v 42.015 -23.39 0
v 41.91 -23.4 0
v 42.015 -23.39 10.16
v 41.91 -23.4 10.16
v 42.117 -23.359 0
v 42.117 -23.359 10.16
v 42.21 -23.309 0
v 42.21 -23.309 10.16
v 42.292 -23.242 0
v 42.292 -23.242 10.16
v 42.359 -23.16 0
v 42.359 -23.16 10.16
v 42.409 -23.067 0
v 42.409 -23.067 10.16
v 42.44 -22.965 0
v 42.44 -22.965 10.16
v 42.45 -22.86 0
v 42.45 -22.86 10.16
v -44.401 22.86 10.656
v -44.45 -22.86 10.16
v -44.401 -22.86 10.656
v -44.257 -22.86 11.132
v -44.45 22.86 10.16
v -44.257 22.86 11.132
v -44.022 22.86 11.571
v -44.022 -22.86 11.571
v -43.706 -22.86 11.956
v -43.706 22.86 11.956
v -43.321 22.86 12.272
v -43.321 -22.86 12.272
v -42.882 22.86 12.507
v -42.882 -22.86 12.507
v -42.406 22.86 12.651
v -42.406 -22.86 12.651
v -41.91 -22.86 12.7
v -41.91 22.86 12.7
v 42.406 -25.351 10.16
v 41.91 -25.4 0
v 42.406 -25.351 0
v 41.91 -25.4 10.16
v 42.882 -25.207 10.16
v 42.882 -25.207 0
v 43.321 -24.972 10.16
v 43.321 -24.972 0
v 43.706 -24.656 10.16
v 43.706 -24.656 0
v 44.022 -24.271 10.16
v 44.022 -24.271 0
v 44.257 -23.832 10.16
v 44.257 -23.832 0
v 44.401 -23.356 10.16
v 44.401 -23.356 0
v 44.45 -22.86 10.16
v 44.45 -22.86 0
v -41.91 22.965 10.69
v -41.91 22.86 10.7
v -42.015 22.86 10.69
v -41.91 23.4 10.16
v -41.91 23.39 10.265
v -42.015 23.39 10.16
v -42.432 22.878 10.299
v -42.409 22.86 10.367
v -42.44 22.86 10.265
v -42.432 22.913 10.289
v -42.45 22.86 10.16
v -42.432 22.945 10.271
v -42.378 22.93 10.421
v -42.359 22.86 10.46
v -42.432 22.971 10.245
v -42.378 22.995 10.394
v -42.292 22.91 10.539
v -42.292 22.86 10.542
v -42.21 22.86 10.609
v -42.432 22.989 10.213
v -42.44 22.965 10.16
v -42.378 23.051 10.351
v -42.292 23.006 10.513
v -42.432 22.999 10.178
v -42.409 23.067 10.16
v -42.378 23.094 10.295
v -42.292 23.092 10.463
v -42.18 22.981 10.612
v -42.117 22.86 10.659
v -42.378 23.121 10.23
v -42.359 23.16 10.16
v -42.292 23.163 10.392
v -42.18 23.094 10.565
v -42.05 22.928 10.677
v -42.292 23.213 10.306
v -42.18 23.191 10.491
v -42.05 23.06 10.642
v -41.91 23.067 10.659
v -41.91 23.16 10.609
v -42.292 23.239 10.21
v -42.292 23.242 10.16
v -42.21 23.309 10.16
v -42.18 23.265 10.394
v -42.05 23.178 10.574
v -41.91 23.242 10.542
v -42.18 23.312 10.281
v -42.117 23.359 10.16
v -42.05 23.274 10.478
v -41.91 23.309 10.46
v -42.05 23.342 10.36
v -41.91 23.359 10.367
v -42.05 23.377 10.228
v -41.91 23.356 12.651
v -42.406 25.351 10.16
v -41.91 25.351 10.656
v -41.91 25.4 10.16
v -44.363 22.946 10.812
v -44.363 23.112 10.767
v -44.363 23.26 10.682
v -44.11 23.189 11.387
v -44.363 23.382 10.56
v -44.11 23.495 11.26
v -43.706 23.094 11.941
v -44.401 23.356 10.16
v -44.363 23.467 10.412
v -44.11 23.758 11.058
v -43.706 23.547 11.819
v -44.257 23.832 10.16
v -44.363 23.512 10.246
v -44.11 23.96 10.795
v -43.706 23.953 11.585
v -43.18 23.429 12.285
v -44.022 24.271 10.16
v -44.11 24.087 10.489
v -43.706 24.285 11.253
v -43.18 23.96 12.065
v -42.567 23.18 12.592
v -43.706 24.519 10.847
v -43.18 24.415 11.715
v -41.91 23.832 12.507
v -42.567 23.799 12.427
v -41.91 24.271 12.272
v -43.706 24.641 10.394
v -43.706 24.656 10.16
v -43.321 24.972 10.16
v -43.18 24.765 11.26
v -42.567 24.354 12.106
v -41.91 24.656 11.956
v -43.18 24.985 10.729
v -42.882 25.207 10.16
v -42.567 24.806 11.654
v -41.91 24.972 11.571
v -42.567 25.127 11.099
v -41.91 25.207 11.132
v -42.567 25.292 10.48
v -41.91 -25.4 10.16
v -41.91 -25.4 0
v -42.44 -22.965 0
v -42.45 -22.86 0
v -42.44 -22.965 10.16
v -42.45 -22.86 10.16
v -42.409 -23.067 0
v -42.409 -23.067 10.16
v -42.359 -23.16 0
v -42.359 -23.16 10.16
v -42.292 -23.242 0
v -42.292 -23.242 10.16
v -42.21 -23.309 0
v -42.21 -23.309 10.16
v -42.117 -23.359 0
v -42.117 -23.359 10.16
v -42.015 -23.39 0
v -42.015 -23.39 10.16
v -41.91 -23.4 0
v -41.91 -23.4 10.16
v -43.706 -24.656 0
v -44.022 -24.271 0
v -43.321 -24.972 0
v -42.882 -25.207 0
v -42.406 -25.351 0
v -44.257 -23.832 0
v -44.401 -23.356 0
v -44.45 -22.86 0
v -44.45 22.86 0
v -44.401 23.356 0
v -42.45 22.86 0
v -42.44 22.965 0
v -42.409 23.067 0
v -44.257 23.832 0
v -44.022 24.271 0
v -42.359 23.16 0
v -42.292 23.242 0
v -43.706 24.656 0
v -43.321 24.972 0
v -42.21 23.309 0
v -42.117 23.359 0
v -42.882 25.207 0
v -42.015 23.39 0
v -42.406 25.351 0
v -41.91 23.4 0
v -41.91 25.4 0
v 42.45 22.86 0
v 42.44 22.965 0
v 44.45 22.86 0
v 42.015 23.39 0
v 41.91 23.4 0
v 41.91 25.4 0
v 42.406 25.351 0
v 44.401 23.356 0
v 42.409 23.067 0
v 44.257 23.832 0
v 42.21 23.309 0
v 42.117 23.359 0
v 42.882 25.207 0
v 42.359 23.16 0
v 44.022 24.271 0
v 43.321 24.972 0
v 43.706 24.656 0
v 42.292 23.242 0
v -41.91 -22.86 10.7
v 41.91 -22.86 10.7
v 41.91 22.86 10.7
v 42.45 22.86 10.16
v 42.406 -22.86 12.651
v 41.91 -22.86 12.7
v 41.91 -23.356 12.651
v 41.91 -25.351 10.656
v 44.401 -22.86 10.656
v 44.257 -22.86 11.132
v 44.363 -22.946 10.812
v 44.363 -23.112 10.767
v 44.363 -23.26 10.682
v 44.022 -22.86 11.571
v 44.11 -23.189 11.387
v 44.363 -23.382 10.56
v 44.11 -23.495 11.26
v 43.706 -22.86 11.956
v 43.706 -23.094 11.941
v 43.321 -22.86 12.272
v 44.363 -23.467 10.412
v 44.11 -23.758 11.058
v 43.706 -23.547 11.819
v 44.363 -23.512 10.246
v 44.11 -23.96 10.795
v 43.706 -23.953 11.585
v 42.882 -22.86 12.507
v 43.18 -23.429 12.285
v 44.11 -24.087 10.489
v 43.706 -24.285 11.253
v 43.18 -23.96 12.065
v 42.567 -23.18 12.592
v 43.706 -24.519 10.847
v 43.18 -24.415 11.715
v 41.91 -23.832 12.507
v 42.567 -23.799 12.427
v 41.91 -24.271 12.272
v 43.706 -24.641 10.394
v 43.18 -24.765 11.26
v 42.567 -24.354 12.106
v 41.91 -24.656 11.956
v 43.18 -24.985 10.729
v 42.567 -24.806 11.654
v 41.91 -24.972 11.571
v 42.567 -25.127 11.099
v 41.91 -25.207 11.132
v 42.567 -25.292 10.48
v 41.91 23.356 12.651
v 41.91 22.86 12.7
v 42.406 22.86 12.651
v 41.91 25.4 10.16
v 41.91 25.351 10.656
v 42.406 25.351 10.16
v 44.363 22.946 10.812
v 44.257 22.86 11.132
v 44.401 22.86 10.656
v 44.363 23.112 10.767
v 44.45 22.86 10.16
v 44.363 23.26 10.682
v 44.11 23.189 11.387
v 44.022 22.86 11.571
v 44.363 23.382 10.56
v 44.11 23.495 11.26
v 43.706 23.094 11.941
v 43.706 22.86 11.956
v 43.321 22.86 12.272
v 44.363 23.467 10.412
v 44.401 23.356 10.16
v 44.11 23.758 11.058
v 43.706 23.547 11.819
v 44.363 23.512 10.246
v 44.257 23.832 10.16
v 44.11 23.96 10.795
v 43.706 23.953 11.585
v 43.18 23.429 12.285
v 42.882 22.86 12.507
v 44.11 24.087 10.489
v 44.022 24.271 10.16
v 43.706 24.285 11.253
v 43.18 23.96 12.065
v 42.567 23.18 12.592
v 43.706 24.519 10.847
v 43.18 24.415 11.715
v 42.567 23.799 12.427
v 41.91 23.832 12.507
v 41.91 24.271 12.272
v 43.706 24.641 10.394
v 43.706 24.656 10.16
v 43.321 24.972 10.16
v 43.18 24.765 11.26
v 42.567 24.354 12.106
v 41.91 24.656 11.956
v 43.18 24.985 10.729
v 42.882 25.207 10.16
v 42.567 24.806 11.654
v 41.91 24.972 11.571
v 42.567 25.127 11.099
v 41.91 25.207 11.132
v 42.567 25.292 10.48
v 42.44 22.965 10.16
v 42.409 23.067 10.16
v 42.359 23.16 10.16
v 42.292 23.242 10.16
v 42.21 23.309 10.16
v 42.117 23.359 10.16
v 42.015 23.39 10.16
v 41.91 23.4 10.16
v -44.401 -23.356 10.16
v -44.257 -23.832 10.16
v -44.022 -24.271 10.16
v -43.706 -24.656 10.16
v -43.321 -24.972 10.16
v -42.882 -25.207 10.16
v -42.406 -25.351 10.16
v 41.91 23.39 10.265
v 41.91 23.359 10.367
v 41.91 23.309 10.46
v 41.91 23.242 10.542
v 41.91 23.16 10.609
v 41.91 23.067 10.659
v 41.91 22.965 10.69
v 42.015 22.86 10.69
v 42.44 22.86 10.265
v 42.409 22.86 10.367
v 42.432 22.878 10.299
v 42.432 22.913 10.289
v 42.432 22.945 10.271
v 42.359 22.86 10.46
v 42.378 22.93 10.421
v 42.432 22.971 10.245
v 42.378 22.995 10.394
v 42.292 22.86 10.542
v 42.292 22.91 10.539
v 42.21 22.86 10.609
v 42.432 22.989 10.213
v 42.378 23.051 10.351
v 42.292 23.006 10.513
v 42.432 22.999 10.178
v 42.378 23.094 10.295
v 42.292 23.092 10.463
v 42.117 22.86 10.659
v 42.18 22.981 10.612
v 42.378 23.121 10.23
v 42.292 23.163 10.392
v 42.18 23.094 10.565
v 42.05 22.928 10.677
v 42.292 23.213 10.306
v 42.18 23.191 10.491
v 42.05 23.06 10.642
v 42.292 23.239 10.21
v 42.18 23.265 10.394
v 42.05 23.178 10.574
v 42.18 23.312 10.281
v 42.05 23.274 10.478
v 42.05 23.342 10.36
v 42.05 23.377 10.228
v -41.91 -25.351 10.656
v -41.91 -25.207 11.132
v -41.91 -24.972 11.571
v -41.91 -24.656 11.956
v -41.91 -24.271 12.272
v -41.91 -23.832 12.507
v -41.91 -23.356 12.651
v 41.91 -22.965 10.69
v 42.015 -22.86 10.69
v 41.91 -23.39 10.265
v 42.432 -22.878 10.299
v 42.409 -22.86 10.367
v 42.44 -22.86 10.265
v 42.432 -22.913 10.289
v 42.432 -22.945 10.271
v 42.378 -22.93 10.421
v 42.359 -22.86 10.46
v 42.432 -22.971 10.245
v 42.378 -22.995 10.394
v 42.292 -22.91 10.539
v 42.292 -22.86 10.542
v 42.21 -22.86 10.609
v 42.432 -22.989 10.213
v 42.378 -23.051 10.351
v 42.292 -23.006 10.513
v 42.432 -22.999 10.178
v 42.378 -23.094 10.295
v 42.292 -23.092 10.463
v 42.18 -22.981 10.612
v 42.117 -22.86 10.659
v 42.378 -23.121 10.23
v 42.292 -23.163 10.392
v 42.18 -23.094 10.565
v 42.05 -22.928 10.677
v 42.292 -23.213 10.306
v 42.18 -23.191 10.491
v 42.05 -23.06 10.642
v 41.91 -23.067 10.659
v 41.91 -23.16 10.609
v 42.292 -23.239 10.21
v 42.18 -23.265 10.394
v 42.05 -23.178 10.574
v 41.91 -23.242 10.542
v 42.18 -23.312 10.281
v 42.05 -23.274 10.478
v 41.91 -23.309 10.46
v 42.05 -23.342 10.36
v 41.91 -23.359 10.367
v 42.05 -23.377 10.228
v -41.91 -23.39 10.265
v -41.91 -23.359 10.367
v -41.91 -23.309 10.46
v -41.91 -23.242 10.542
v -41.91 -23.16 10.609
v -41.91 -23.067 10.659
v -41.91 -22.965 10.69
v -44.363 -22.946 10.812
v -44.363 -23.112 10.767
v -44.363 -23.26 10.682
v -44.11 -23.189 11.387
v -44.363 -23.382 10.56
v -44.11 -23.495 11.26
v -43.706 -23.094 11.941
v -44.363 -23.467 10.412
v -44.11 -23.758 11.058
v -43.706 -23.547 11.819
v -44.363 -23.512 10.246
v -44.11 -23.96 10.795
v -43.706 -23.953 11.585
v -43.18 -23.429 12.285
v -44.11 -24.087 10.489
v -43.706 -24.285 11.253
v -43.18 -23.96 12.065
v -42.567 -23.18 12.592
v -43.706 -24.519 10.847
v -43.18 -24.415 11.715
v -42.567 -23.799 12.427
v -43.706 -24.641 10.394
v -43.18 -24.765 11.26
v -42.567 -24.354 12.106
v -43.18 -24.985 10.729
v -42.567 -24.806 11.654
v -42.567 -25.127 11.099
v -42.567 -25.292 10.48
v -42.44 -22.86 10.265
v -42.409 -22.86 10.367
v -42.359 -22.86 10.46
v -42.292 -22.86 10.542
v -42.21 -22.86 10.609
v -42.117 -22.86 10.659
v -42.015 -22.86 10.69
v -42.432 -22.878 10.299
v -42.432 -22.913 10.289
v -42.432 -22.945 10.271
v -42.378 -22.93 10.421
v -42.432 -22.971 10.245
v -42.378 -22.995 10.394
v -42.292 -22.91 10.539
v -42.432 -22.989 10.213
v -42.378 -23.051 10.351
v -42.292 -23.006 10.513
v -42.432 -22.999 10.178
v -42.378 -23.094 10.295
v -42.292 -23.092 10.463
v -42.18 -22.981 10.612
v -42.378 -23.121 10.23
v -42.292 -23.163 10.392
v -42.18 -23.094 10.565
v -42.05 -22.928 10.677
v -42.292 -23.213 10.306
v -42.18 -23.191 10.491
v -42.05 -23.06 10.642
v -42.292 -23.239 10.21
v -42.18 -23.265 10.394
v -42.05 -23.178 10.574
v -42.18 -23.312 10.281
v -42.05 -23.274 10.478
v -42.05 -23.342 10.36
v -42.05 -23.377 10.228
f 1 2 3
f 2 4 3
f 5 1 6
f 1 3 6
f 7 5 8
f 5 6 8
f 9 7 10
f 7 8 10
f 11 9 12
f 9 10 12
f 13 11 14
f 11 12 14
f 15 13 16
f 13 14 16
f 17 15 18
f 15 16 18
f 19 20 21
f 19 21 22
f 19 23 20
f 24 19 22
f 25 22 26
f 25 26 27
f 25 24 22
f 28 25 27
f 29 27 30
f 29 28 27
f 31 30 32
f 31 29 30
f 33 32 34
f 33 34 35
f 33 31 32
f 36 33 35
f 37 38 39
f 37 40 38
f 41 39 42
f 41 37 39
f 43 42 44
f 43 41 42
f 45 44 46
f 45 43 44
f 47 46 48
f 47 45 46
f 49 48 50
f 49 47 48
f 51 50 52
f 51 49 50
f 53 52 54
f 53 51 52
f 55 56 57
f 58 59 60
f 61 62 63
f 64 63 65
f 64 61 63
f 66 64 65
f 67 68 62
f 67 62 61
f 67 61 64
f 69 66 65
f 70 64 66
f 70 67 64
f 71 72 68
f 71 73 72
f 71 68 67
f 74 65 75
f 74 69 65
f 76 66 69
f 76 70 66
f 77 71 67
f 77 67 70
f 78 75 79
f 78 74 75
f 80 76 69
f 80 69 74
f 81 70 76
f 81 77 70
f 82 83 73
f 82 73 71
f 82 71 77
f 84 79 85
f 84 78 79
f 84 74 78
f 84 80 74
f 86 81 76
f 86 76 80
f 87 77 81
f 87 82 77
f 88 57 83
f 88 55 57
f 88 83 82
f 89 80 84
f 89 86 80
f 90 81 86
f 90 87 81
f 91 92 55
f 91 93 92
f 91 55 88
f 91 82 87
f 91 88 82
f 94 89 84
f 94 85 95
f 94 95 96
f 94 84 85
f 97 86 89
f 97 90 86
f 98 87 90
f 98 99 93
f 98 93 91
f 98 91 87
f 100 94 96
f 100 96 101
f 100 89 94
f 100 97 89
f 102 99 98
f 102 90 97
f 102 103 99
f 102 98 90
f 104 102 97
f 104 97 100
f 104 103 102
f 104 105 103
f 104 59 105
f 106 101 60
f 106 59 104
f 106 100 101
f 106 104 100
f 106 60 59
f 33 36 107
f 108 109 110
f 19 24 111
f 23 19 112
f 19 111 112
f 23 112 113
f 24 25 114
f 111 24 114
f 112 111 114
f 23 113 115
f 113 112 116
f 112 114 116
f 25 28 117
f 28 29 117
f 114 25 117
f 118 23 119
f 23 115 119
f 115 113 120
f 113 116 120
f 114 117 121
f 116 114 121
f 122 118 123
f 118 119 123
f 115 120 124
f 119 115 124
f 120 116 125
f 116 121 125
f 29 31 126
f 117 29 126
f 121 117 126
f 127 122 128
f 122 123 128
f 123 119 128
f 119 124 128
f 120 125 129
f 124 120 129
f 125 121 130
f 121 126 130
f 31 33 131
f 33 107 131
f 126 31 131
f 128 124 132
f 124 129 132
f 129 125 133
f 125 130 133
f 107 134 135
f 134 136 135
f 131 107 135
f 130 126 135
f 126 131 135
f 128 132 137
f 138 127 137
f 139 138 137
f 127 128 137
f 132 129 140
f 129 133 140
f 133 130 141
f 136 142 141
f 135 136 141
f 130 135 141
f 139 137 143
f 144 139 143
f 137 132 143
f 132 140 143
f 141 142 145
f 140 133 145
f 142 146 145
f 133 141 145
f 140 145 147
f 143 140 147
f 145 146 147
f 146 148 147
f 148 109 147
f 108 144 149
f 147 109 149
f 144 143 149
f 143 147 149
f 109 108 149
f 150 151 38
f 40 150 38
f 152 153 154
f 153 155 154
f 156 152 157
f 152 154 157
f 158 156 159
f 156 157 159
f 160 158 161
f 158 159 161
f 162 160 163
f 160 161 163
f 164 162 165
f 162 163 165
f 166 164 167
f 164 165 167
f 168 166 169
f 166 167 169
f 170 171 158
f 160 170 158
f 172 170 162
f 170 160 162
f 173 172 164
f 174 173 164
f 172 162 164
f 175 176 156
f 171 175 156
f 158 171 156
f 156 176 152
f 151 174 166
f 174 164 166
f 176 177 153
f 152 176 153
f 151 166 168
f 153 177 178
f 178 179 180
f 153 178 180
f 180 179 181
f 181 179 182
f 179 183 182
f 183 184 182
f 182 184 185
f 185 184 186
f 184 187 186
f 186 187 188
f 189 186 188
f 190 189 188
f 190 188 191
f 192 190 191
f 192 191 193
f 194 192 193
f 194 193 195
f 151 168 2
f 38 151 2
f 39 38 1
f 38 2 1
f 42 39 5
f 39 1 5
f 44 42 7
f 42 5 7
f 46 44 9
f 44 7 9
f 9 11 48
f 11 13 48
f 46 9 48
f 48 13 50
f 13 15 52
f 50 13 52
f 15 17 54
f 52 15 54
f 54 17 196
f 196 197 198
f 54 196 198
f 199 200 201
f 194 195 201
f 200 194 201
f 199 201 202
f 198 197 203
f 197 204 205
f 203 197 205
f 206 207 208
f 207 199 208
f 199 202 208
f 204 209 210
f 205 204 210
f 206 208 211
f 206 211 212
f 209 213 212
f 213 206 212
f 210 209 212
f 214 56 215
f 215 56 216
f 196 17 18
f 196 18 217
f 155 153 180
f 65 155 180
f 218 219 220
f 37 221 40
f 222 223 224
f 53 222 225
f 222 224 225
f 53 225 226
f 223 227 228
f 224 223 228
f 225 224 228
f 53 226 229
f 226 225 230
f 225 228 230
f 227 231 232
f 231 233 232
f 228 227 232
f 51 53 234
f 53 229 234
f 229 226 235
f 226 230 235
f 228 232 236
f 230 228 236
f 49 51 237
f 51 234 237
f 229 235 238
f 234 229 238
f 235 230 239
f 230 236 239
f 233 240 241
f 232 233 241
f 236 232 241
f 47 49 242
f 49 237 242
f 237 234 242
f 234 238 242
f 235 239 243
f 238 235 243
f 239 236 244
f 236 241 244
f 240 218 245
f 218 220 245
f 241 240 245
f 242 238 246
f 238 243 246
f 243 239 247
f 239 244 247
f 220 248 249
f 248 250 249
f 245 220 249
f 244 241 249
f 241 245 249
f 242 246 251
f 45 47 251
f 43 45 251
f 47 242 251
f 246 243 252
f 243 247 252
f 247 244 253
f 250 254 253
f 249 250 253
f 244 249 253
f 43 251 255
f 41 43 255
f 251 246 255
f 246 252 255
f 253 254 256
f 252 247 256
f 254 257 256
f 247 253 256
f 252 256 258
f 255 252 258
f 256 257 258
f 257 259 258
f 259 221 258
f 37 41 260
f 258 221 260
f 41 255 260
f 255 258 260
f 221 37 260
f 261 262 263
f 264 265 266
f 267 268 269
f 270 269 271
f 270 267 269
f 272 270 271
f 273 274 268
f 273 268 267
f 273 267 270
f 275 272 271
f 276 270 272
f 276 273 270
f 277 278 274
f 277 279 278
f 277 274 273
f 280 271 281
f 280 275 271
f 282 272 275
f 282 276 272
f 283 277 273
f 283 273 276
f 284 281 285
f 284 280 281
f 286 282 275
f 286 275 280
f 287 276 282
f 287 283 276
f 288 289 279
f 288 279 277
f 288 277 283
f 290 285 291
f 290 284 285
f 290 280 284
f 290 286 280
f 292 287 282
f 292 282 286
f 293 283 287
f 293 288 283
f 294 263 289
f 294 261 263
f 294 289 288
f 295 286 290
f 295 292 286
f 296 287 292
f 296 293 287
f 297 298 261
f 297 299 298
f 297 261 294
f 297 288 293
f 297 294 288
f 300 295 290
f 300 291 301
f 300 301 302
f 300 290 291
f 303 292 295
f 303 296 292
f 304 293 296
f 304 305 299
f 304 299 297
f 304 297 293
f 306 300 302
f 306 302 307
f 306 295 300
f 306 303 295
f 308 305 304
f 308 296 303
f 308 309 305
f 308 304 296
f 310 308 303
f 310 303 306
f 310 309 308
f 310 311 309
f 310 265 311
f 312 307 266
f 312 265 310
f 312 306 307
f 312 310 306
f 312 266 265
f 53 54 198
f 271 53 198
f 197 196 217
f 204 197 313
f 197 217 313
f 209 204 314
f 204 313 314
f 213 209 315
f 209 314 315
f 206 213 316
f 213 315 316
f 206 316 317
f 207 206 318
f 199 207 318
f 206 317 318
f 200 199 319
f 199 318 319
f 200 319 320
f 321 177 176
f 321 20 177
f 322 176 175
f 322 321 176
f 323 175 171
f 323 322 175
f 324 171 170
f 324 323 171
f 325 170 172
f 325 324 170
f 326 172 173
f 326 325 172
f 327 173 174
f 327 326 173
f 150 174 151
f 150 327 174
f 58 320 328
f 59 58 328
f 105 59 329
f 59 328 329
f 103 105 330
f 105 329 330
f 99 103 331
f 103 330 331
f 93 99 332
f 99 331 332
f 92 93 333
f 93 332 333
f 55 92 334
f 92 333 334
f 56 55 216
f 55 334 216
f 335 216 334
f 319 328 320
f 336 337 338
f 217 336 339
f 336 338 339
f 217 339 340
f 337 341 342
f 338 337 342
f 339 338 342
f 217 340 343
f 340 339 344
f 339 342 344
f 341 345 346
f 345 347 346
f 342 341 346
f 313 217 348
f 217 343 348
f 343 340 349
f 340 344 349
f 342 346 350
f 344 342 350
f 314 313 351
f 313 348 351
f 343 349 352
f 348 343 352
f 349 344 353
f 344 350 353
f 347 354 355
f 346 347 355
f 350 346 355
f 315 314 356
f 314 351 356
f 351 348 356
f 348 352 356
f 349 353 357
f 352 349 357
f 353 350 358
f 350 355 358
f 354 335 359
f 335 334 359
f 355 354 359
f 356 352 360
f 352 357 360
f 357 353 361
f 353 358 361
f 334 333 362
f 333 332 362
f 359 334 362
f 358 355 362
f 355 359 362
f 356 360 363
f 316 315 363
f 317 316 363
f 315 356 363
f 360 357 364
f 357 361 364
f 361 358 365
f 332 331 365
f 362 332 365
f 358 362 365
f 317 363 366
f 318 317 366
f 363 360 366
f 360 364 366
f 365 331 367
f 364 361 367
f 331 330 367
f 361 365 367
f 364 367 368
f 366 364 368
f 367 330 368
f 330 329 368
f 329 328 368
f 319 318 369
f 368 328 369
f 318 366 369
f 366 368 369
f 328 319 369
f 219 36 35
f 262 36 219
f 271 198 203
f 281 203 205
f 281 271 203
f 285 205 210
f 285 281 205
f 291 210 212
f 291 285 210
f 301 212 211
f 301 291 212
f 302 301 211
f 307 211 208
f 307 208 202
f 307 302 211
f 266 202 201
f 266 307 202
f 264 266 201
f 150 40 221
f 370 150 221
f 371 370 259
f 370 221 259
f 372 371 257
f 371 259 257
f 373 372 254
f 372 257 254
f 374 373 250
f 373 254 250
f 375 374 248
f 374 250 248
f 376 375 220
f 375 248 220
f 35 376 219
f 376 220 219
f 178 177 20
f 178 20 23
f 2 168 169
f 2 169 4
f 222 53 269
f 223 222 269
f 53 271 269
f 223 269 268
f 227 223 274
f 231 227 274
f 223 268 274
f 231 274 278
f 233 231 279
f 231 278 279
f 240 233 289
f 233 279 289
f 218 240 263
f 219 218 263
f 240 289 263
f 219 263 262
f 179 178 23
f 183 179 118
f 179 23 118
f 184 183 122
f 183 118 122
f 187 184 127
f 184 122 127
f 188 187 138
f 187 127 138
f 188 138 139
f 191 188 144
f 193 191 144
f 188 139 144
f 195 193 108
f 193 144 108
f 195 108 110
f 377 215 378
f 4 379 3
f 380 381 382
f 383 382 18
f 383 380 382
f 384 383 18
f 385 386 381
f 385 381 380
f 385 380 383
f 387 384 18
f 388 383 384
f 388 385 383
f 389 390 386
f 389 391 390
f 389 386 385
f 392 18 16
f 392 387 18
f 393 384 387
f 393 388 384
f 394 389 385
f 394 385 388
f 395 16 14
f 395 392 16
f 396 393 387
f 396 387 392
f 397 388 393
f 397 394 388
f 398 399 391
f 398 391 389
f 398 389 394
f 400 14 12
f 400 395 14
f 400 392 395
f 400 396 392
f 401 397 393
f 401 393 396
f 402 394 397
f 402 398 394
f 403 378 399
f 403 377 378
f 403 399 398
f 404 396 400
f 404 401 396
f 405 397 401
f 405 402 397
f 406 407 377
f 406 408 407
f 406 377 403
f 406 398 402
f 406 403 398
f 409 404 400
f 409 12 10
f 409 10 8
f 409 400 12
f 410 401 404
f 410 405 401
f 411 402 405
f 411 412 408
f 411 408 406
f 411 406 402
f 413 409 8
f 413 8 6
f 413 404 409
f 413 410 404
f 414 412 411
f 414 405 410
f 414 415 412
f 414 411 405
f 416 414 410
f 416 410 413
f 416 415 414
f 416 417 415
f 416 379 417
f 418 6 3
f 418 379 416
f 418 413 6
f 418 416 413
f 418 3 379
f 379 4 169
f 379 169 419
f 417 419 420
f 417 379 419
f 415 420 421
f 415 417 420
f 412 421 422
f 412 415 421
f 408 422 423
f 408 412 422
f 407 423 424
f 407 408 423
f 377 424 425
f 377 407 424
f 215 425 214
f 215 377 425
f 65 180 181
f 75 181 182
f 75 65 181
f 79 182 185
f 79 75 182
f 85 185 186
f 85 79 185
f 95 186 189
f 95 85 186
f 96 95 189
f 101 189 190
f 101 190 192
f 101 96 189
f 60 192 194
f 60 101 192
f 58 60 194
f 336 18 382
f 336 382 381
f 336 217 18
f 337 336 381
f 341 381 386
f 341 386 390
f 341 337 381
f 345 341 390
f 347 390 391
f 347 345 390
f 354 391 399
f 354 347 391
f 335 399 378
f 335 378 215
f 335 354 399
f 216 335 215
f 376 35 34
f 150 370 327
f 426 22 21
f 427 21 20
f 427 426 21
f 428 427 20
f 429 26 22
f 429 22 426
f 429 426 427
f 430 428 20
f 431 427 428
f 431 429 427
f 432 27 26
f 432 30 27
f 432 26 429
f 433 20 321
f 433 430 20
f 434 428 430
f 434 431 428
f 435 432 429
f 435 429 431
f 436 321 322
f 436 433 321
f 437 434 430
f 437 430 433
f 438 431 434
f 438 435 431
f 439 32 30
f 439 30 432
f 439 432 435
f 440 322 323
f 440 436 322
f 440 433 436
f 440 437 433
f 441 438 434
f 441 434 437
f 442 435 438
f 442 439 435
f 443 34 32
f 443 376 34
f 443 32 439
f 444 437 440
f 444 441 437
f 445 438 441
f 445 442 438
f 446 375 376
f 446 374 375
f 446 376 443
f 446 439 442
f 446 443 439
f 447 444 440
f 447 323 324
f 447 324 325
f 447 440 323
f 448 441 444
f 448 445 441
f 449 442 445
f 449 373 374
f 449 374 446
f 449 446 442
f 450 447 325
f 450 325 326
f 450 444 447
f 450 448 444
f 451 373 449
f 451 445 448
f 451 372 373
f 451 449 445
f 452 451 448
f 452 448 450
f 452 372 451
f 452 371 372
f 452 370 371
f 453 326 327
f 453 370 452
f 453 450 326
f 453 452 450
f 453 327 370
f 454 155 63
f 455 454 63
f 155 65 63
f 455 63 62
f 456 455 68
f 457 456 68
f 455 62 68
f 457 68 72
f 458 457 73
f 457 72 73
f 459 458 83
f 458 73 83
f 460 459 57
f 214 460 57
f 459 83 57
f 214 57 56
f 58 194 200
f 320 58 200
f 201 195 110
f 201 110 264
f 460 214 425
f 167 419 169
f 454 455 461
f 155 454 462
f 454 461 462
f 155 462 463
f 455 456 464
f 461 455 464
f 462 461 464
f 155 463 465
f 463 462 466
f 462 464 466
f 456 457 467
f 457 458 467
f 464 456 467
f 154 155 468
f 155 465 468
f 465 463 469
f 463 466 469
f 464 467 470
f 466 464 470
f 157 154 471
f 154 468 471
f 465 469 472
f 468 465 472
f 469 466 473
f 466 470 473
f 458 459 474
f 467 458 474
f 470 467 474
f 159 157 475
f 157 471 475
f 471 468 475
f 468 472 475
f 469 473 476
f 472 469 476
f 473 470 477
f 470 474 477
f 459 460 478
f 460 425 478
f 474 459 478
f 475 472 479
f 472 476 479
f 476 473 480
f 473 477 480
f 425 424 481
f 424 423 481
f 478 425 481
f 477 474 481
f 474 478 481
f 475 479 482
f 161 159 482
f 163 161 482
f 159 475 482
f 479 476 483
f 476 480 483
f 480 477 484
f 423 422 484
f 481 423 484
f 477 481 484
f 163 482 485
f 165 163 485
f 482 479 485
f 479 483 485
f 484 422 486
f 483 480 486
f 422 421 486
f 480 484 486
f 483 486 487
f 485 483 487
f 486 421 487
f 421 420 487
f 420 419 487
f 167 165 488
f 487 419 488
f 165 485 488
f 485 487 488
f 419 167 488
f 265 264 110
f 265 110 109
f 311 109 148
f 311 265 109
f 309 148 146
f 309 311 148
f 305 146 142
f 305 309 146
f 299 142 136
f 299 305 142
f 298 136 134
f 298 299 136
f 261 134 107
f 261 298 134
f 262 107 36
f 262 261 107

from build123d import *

# Parameters (mm, degrees)
F0_W     = 88.9
F0_H     = 50.8
F1_DEPTH = 12.7
F2_R     = 2.54
F3_T     = -2


with BuildPart() as f1:
    # F0 (on Top) → F1 (new body)
    with BuildSketch(Plane.XY):
        Rectangle(F0_W, F0_H)
    extrude(amount=F1_DEPTH)

    # F2
    f2_edges = [f1.edges().sort_by_distance(p)[0] for p in [
        (0, -25.4, 12.7),
        (0, 25.4, 12.7),
        (44.45, 0, 12.7),
        (-44.45, 0, 12.7),
        (-44.45, 25.4, 6.35),
        (-44.45, -25.4, 6.35),
        (44.45, -25.4, 6.35),
        (44.45, 25.4, 6.35),
    ]]
    fillet(f2_edges, radius=F2_R)

    # F3
    f3_openings = [f1.faces().sort_by_distance(p)[0] for p in [
        (0, 0, 0),
    ]]
    offset(amount=F3_T, openings=f3_openings)


solid = f1.part
